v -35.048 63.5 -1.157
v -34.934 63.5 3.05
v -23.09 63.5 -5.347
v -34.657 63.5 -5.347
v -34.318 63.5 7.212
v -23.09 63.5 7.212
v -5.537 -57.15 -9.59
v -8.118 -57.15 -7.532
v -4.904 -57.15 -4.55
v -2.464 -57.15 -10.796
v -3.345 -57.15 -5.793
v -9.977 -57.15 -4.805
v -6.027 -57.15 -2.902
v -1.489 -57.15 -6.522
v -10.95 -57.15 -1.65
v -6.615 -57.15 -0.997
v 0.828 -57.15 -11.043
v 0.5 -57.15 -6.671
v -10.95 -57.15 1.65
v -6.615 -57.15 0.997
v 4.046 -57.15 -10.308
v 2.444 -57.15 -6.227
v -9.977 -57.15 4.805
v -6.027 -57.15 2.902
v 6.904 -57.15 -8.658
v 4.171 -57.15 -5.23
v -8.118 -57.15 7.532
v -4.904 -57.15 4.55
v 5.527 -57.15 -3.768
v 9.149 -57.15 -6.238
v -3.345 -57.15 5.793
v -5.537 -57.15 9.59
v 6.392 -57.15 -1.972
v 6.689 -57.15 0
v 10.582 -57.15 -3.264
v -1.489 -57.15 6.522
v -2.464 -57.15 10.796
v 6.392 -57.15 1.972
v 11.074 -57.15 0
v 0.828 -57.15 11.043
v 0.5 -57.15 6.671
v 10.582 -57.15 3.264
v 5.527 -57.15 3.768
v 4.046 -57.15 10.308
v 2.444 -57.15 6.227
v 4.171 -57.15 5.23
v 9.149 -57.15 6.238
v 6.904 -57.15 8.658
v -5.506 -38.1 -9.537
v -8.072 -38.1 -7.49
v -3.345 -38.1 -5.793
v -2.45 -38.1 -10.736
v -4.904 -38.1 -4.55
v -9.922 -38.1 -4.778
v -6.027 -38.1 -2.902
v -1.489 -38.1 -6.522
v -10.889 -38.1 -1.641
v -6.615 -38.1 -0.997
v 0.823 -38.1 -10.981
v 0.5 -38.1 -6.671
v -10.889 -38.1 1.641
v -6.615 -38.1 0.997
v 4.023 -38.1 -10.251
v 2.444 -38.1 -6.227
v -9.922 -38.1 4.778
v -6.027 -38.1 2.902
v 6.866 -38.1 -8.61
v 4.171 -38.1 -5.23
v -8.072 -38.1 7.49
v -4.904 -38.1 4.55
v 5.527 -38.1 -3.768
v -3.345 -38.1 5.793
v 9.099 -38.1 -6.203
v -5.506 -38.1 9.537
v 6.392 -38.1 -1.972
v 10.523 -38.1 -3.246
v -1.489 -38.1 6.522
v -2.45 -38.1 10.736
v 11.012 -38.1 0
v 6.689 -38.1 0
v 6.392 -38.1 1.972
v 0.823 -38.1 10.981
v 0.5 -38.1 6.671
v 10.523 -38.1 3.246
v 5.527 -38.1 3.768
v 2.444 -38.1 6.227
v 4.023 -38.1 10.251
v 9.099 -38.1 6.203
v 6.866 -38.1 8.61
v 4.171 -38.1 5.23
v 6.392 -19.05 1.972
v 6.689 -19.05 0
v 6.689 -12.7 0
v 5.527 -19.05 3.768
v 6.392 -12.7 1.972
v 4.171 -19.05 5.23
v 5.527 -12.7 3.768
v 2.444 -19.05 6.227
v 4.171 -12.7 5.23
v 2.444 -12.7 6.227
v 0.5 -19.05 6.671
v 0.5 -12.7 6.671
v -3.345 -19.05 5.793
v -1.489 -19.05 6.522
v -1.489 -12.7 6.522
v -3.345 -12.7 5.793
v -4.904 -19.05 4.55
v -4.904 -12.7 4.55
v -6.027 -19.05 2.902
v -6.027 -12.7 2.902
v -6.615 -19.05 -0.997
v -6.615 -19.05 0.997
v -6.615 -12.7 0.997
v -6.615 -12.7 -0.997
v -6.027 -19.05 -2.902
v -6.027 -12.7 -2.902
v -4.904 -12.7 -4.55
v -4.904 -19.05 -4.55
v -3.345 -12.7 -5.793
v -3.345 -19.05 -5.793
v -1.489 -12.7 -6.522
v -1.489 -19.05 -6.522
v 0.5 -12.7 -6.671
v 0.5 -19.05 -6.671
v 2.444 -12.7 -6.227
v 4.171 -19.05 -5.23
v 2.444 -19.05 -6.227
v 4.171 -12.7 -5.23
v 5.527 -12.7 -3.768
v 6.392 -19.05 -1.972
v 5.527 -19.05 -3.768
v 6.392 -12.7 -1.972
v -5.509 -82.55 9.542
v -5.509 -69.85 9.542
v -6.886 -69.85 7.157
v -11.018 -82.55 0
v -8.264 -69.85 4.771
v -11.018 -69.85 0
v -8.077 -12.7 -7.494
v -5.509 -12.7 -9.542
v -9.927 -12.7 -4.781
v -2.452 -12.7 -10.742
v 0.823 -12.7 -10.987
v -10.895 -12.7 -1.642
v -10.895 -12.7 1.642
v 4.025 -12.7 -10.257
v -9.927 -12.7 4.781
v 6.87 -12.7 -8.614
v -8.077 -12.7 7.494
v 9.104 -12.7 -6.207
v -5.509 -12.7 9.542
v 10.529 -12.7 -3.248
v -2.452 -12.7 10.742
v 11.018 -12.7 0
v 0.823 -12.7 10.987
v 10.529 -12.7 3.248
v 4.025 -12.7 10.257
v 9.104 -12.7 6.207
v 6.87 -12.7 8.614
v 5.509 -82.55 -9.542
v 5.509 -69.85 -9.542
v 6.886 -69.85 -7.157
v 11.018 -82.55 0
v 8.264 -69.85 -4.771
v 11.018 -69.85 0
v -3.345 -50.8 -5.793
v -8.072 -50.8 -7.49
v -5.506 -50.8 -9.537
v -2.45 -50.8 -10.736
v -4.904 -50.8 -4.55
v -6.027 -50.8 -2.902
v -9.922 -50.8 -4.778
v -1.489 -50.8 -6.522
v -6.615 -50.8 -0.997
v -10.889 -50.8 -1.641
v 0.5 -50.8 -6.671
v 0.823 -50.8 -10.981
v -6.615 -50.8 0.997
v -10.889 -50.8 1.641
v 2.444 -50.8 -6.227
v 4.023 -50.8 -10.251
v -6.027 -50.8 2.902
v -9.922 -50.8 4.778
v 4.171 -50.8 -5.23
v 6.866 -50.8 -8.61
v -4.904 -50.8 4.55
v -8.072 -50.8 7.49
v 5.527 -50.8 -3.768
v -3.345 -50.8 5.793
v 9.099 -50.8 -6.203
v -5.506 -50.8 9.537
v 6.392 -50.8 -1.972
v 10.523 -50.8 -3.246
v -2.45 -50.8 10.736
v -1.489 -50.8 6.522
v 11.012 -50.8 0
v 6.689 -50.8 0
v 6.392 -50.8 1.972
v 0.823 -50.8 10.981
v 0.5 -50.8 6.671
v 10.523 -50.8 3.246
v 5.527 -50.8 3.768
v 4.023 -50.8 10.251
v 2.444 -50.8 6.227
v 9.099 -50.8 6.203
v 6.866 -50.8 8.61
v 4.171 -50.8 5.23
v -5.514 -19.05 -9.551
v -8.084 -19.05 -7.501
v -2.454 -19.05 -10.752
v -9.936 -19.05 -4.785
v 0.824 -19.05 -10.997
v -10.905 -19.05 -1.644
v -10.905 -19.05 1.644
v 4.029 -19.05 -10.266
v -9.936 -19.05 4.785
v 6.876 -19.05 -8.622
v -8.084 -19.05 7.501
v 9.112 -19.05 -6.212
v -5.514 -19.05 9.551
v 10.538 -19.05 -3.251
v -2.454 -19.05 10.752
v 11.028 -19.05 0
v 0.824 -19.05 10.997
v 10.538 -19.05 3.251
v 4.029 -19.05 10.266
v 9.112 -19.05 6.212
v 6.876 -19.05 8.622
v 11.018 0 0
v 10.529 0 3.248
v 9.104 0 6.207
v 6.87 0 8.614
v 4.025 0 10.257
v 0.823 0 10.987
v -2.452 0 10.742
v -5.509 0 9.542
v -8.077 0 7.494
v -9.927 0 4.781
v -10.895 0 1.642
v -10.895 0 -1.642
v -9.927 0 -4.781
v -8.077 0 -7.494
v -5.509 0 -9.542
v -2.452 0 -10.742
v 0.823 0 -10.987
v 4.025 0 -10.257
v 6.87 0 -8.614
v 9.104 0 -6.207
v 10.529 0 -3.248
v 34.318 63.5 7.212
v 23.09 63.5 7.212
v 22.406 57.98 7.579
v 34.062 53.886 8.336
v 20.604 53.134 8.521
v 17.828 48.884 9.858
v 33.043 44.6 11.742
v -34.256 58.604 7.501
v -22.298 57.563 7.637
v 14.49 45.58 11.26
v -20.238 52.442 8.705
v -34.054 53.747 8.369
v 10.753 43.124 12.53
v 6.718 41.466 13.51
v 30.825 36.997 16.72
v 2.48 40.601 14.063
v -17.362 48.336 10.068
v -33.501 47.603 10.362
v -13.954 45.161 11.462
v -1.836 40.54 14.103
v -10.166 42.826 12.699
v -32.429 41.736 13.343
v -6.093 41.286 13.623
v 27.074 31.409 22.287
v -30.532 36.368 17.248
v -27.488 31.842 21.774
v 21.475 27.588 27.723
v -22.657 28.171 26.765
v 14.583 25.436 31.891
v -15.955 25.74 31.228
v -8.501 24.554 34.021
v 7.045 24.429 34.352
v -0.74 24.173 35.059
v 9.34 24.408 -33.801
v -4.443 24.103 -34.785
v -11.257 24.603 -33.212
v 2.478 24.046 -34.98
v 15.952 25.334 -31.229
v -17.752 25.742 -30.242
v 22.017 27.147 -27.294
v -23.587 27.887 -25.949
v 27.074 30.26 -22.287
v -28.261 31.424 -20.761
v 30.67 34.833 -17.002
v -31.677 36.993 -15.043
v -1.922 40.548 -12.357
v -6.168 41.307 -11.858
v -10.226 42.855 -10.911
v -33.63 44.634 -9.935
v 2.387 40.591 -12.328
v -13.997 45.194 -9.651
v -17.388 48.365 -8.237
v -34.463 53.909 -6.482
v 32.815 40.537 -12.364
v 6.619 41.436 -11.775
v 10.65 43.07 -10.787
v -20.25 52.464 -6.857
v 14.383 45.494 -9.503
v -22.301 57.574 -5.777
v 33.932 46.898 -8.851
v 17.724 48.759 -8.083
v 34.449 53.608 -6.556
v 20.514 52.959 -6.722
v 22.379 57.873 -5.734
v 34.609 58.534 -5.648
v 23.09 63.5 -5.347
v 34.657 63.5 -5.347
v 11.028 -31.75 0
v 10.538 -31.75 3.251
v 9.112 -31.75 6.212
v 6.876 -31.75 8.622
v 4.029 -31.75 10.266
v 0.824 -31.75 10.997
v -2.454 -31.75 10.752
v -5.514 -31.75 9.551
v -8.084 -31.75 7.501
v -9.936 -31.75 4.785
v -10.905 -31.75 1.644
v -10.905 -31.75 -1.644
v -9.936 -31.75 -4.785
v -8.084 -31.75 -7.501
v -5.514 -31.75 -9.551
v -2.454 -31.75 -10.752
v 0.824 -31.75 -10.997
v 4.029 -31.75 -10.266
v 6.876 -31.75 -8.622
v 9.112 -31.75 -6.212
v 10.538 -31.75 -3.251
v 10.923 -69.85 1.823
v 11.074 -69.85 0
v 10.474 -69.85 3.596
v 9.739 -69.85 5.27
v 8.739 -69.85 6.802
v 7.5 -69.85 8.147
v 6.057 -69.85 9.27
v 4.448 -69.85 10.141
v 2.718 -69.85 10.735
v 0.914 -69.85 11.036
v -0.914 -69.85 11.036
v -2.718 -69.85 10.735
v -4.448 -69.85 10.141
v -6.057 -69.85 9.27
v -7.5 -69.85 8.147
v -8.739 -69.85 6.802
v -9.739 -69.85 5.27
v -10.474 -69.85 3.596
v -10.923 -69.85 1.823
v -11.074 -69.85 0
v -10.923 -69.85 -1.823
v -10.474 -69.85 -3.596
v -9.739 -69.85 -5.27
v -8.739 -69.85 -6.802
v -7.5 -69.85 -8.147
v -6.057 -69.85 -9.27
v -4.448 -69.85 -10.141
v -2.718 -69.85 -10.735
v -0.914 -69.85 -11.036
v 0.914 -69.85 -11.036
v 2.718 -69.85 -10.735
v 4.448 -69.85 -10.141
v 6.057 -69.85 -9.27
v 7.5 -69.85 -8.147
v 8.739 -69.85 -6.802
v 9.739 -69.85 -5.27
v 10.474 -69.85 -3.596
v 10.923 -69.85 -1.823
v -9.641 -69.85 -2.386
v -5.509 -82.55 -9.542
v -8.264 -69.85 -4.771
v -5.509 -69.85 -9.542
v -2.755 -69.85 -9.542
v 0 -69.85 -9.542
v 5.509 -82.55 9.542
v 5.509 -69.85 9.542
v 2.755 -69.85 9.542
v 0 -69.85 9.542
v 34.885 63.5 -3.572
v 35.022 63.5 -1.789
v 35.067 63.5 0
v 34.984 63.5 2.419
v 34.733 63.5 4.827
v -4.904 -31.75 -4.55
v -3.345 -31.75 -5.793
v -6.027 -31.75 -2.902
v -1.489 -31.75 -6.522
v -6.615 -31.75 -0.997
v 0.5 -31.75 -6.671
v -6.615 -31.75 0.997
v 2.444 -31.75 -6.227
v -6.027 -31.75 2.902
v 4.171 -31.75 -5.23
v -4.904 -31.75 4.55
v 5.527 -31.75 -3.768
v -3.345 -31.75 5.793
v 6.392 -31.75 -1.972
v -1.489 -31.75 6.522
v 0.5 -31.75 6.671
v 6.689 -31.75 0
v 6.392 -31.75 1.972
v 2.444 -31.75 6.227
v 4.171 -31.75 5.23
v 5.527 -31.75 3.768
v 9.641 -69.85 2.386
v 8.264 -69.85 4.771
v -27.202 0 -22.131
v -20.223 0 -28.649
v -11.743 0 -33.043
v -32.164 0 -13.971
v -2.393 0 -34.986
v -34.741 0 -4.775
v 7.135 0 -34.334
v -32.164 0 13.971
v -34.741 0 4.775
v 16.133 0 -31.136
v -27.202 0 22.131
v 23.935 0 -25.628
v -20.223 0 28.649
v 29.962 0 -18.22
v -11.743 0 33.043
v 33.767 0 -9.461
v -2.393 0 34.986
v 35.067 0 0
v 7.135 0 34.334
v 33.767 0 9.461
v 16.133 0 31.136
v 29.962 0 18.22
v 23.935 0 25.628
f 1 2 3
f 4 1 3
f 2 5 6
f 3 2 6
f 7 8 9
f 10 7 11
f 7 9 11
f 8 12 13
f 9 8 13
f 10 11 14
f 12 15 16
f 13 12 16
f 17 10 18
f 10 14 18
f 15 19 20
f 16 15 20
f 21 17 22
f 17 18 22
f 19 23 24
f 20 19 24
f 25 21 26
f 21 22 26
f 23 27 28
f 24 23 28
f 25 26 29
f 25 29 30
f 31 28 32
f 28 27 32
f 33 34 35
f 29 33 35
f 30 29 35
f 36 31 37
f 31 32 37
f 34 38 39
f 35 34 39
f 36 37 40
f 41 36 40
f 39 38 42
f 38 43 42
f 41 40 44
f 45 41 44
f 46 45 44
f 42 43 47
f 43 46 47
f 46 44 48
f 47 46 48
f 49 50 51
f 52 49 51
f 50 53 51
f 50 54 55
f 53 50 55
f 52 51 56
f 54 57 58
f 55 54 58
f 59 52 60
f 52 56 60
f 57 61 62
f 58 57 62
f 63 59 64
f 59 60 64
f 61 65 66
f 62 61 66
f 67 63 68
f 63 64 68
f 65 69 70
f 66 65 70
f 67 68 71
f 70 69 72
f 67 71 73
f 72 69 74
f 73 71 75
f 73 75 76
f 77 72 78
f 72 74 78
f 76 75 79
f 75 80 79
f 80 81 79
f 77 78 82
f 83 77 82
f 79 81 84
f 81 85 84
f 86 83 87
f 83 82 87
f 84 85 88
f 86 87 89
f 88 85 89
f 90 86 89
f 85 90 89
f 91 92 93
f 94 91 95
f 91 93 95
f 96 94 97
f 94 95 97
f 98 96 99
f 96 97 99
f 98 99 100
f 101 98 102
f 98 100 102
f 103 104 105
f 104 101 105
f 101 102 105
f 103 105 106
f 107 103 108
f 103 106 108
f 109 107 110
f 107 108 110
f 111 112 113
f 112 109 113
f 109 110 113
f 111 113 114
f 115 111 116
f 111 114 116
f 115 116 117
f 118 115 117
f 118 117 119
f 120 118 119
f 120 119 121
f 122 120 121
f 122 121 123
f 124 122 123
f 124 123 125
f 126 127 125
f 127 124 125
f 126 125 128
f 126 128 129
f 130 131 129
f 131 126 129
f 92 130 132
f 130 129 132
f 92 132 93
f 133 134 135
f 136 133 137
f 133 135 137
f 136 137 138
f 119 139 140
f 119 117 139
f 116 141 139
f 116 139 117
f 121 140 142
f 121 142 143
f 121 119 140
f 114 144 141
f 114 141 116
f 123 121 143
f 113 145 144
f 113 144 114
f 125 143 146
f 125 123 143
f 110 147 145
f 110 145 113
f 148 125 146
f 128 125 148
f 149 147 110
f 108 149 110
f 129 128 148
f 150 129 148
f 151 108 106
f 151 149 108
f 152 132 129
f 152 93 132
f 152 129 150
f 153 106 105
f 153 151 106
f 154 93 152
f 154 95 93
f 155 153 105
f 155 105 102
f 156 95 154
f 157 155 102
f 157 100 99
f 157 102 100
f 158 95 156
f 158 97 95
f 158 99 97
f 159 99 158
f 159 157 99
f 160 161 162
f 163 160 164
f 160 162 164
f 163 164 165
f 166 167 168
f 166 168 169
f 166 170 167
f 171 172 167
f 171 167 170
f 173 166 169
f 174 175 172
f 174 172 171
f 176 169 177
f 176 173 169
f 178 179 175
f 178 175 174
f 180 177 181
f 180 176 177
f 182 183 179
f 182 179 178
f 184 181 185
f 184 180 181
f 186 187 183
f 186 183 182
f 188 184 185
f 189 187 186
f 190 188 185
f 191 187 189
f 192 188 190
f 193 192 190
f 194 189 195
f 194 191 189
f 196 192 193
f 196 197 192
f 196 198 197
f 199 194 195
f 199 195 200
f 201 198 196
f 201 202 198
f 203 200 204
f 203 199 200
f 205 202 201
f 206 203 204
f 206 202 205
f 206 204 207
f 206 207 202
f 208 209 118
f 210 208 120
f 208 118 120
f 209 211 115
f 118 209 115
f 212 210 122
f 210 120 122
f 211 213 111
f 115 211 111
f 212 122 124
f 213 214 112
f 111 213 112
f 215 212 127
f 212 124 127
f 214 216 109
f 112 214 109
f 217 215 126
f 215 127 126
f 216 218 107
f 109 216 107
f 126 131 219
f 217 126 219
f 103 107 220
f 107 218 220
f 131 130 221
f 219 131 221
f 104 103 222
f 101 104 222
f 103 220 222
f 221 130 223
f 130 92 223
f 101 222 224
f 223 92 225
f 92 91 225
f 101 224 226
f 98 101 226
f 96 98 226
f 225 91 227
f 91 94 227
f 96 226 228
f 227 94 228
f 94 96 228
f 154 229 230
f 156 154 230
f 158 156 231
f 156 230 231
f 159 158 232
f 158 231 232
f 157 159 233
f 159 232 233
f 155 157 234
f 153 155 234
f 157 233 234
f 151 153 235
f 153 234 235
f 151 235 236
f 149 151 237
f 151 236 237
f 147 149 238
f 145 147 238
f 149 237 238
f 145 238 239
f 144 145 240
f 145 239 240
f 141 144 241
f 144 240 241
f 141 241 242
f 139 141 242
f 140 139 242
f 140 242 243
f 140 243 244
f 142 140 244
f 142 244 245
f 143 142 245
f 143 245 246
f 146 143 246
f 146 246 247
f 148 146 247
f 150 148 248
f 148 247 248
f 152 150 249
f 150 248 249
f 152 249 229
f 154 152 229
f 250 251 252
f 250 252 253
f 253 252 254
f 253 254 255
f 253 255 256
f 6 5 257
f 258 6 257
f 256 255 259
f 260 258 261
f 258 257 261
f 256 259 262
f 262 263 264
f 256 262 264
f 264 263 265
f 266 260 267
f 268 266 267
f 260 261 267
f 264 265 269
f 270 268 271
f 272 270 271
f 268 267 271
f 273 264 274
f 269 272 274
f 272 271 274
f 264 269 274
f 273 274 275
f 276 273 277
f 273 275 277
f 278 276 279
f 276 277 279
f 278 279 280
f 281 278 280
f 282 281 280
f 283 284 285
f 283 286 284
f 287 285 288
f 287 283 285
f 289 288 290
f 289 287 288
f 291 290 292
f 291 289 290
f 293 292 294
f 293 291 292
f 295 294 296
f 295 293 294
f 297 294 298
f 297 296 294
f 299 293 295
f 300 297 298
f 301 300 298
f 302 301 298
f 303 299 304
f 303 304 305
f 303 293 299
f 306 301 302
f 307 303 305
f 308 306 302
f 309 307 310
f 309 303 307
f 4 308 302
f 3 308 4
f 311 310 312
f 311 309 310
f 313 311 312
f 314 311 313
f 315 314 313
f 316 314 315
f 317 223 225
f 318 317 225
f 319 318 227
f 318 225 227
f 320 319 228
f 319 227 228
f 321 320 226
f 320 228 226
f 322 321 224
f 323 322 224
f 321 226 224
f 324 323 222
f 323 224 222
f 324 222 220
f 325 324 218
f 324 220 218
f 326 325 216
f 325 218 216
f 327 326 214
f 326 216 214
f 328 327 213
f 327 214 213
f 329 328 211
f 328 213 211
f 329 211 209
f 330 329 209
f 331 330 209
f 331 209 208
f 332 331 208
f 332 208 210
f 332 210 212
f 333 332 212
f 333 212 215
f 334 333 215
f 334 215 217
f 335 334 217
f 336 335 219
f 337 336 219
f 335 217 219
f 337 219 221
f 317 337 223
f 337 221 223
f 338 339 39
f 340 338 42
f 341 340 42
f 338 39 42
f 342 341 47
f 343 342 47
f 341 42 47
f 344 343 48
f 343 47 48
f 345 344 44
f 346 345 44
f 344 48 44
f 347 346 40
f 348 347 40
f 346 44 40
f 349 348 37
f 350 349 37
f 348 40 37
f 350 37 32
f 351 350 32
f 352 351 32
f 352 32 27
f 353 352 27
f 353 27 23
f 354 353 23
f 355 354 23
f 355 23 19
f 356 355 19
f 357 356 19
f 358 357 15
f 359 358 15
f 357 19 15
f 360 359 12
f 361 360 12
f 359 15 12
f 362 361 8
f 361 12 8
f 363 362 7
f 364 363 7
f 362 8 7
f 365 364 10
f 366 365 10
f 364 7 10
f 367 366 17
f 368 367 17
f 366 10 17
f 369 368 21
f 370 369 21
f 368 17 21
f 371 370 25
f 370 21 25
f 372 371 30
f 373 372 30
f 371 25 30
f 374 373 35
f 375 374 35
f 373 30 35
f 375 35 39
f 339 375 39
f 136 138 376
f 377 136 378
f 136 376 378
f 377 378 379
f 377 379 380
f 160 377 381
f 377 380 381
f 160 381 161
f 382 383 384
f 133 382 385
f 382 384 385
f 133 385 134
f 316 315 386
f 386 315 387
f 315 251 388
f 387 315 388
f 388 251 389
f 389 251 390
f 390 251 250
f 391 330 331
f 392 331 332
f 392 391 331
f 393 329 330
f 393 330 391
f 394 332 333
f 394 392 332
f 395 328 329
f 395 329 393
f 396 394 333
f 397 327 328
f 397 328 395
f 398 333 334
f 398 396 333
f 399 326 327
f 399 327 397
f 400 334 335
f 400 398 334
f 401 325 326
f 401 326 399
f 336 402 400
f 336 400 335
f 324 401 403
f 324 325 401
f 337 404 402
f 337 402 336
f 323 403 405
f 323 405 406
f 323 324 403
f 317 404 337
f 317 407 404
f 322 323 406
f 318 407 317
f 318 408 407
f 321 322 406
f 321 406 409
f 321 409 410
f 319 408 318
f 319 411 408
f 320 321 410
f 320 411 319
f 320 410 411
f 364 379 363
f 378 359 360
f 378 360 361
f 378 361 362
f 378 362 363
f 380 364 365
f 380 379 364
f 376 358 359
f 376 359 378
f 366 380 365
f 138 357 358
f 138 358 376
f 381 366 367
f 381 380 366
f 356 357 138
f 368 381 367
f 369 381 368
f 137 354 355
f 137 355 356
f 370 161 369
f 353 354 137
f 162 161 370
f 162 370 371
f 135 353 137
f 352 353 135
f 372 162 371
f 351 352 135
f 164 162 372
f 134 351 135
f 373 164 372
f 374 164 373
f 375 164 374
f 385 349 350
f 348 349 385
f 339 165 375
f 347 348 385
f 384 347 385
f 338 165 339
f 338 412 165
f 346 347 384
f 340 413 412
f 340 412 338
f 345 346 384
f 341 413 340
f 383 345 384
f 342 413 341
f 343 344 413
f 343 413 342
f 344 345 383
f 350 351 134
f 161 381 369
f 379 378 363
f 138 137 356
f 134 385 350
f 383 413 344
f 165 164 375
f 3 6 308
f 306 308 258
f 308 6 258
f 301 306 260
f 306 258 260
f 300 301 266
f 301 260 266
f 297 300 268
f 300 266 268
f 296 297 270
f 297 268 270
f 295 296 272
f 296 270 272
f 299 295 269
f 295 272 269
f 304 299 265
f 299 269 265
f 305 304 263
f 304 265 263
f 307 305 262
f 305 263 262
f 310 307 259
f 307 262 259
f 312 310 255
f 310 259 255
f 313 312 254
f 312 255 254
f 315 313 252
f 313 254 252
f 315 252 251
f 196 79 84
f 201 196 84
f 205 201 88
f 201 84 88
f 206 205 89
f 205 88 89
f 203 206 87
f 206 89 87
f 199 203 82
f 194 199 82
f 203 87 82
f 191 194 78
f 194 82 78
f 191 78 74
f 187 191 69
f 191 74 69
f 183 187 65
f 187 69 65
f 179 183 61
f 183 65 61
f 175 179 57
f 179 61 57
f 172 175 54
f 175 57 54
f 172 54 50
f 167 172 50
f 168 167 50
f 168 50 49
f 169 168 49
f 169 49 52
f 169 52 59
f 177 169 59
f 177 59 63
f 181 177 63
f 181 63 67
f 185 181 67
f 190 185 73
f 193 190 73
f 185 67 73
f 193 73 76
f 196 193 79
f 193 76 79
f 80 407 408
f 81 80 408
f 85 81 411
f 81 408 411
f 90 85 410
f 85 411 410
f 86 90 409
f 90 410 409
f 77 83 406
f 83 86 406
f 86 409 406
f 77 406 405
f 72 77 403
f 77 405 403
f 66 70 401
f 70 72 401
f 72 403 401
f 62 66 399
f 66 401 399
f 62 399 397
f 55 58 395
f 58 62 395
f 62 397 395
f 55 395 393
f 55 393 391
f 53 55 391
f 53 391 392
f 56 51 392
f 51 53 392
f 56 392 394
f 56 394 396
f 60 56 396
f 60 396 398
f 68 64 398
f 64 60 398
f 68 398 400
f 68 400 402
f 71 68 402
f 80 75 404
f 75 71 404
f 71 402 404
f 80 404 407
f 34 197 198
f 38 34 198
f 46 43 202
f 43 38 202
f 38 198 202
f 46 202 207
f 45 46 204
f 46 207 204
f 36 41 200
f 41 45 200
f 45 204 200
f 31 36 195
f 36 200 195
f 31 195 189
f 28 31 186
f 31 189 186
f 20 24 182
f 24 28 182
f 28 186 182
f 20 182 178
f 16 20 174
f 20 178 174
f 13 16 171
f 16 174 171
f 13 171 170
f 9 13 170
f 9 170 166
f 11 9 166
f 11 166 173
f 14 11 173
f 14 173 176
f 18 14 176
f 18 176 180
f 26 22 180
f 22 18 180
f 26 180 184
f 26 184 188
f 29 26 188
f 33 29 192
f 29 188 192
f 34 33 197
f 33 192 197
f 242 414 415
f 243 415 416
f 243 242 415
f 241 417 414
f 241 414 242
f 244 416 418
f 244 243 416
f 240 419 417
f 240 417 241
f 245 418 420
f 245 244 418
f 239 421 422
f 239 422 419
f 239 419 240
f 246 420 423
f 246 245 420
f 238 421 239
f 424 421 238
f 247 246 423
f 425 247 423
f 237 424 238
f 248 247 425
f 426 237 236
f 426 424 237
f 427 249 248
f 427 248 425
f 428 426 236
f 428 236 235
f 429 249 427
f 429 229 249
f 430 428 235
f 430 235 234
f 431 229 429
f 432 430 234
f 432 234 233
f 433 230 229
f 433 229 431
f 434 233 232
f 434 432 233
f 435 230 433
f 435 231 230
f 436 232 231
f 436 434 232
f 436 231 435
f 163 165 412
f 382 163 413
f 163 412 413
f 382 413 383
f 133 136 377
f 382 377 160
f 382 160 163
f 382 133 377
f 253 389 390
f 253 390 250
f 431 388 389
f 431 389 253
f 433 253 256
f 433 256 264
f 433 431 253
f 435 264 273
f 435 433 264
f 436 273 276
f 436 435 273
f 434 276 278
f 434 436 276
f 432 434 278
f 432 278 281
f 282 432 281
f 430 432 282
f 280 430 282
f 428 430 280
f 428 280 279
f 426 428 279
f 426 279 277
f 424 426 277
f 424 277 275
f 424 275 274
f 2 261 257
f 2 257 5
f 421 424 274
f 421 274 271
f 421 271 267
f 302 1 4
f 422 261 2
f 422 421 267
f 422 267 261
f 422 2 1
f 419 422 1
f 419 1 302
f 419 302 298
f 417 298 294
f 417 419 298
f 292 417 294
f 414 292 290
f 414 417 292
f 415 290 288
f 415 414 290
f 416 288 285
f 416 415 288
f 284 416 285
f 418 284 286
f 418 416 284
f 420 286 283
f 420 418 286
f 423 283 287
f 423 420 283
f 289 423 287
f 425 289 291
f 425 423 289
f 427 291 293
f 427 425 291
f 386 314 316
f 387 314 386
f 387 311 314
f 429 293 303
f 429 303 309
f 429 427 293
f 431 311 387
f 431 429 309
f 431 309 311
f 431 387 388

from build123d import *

# Parameters (mm, degrees)
F0_R      = 35.0672788862
F1_DEPTH  = 63.5
F2_R      = 11.0181598278
F3_DEPTH  = 12.7
F4_R      = 6.6894153835
F5_DEPTH  = 69.85
F7_START  = 50.8
F7_DEPTH  = 19.05
F9_START  = 6.35
F8_R      = 11.0281331537
F9_DEPTH  = 12.7
F11_START = 6.35
F10_R     = 11.0120586673
F11_DEPTH = 12.7
F13_START = 6.35
F12_R     = 11.0736476733
F13_DEPTH = 12.7
F18_R     = 23.0898876608
F19_DEPTH = 63.5


with BuildPart() as f1:
    # F0 (on Front) → F1 (new body)
    with BuildSketch(Plane.XZ):
        Circle(F0_R)
    extrude(amount=-F1_DEPTH)

    # F2 (on face) → F3 (join)
    with BuildSketch(Plane.XZ):
        Circle(F2_R)
    extrude(amount=F3_DEPTH)

    # F4 (on face) → F5 (join)
    with BuildSketch(Plane.XZ.offset(12.7)):
        Circle(F4_R)
    extrude(amount=F5_DEPTH)

    # F6 (on face) → F7 (join)
    with BuildSketch(Plane.XZ.offset(12.7).offset(F7_START)):
        Polygon((-5.5090799139, -9.5420063138), (5.5090799139, -9.5420063138), (11.0181598278, 0), (5.5090799139, 9.5420063138), (-5.5090799139, 9.5420063138), (-11.0181598278, 0), align=None)
    extrude(amount=F7_DEPTH)

    # F8 (on face) → F9 (join)
    with BuildSketch(Plane.XZ.offset(12.7).offset(F9_START)):
        Circle(F8_R)
    extrude(amount=F9_DEPTH)

    # F10 (on face) → F11 (join)
    with BuildSketch(Plane.XZ.offset(31.75).offset(F11_START)):
        Circle(F10_R)
    extrude(amount=F11_DEPTH)

    # F12 (on face) → F13 (join)
    with BuildSketch(Plane.XZ.offset(50.8).offset(F13_START)):
        Circle(F12_R)
    extrude(amount=F13_DEPTH)

    # F14 (on face) → F15 (revolve, cut)
    with BuildSketch(Plane(origin=(0, 63.5, 0), x_dir=(-1, 0, 0), z_dir=(0, 1, 0))):
        with BuildLine():
            ThreePointArc((-34.6572299507, -5.3470048278), (0, -35.0672788862), (34.6572299507, -5.3470048278))
            Line((34.6572299507, -5.3470048278), (18.4994737599, -5.3470048278))
            Line((18.4994737599, -5.3470048278), (-18.4994737599, -5.3470048278))
            Line((-18.4994737599, -5.3470048278), (-34.6572299507, -5.3470048278))
        make_face()
    revolve(axis=Axis((-2.320465399, 63.5, -46.4284271002), (-1, 0, 0)), mode=Mode.SUBTRACT)

    # F16 (on face) → F17 (revolve, cut)
    with BuildSketch(Plane(origin=(0, 63.5, 0), x_dir=(-1, 0, 0), z_dir=(0, 1, 0))):
        with BuildLine():
            ThreePointArc((34.3176019657, 7.2122287682), (0, 40.5588116187), (-34.3176019657, 7.2122287682))
            Line((-34.3176019657, 7.2122287682), (34.3176019657, 7.2122287682))
        make_face()
    revolve(axis=Axis((-9.9174939096, 63.5, 48.9058308303), (-1, 0, 0)), mode=Mode.SUBTRACT)

    # F18 (on Top) → F19 (cut, symmetric)
    with BuildSketch(Plane.XY):
        with Locations((0, 63.5572820902)):
            Circle(F18_R)
    extrude(amount=F19_DEPTH, both=True, mode=Mode.SUBTRACT)


solid = f1.part
